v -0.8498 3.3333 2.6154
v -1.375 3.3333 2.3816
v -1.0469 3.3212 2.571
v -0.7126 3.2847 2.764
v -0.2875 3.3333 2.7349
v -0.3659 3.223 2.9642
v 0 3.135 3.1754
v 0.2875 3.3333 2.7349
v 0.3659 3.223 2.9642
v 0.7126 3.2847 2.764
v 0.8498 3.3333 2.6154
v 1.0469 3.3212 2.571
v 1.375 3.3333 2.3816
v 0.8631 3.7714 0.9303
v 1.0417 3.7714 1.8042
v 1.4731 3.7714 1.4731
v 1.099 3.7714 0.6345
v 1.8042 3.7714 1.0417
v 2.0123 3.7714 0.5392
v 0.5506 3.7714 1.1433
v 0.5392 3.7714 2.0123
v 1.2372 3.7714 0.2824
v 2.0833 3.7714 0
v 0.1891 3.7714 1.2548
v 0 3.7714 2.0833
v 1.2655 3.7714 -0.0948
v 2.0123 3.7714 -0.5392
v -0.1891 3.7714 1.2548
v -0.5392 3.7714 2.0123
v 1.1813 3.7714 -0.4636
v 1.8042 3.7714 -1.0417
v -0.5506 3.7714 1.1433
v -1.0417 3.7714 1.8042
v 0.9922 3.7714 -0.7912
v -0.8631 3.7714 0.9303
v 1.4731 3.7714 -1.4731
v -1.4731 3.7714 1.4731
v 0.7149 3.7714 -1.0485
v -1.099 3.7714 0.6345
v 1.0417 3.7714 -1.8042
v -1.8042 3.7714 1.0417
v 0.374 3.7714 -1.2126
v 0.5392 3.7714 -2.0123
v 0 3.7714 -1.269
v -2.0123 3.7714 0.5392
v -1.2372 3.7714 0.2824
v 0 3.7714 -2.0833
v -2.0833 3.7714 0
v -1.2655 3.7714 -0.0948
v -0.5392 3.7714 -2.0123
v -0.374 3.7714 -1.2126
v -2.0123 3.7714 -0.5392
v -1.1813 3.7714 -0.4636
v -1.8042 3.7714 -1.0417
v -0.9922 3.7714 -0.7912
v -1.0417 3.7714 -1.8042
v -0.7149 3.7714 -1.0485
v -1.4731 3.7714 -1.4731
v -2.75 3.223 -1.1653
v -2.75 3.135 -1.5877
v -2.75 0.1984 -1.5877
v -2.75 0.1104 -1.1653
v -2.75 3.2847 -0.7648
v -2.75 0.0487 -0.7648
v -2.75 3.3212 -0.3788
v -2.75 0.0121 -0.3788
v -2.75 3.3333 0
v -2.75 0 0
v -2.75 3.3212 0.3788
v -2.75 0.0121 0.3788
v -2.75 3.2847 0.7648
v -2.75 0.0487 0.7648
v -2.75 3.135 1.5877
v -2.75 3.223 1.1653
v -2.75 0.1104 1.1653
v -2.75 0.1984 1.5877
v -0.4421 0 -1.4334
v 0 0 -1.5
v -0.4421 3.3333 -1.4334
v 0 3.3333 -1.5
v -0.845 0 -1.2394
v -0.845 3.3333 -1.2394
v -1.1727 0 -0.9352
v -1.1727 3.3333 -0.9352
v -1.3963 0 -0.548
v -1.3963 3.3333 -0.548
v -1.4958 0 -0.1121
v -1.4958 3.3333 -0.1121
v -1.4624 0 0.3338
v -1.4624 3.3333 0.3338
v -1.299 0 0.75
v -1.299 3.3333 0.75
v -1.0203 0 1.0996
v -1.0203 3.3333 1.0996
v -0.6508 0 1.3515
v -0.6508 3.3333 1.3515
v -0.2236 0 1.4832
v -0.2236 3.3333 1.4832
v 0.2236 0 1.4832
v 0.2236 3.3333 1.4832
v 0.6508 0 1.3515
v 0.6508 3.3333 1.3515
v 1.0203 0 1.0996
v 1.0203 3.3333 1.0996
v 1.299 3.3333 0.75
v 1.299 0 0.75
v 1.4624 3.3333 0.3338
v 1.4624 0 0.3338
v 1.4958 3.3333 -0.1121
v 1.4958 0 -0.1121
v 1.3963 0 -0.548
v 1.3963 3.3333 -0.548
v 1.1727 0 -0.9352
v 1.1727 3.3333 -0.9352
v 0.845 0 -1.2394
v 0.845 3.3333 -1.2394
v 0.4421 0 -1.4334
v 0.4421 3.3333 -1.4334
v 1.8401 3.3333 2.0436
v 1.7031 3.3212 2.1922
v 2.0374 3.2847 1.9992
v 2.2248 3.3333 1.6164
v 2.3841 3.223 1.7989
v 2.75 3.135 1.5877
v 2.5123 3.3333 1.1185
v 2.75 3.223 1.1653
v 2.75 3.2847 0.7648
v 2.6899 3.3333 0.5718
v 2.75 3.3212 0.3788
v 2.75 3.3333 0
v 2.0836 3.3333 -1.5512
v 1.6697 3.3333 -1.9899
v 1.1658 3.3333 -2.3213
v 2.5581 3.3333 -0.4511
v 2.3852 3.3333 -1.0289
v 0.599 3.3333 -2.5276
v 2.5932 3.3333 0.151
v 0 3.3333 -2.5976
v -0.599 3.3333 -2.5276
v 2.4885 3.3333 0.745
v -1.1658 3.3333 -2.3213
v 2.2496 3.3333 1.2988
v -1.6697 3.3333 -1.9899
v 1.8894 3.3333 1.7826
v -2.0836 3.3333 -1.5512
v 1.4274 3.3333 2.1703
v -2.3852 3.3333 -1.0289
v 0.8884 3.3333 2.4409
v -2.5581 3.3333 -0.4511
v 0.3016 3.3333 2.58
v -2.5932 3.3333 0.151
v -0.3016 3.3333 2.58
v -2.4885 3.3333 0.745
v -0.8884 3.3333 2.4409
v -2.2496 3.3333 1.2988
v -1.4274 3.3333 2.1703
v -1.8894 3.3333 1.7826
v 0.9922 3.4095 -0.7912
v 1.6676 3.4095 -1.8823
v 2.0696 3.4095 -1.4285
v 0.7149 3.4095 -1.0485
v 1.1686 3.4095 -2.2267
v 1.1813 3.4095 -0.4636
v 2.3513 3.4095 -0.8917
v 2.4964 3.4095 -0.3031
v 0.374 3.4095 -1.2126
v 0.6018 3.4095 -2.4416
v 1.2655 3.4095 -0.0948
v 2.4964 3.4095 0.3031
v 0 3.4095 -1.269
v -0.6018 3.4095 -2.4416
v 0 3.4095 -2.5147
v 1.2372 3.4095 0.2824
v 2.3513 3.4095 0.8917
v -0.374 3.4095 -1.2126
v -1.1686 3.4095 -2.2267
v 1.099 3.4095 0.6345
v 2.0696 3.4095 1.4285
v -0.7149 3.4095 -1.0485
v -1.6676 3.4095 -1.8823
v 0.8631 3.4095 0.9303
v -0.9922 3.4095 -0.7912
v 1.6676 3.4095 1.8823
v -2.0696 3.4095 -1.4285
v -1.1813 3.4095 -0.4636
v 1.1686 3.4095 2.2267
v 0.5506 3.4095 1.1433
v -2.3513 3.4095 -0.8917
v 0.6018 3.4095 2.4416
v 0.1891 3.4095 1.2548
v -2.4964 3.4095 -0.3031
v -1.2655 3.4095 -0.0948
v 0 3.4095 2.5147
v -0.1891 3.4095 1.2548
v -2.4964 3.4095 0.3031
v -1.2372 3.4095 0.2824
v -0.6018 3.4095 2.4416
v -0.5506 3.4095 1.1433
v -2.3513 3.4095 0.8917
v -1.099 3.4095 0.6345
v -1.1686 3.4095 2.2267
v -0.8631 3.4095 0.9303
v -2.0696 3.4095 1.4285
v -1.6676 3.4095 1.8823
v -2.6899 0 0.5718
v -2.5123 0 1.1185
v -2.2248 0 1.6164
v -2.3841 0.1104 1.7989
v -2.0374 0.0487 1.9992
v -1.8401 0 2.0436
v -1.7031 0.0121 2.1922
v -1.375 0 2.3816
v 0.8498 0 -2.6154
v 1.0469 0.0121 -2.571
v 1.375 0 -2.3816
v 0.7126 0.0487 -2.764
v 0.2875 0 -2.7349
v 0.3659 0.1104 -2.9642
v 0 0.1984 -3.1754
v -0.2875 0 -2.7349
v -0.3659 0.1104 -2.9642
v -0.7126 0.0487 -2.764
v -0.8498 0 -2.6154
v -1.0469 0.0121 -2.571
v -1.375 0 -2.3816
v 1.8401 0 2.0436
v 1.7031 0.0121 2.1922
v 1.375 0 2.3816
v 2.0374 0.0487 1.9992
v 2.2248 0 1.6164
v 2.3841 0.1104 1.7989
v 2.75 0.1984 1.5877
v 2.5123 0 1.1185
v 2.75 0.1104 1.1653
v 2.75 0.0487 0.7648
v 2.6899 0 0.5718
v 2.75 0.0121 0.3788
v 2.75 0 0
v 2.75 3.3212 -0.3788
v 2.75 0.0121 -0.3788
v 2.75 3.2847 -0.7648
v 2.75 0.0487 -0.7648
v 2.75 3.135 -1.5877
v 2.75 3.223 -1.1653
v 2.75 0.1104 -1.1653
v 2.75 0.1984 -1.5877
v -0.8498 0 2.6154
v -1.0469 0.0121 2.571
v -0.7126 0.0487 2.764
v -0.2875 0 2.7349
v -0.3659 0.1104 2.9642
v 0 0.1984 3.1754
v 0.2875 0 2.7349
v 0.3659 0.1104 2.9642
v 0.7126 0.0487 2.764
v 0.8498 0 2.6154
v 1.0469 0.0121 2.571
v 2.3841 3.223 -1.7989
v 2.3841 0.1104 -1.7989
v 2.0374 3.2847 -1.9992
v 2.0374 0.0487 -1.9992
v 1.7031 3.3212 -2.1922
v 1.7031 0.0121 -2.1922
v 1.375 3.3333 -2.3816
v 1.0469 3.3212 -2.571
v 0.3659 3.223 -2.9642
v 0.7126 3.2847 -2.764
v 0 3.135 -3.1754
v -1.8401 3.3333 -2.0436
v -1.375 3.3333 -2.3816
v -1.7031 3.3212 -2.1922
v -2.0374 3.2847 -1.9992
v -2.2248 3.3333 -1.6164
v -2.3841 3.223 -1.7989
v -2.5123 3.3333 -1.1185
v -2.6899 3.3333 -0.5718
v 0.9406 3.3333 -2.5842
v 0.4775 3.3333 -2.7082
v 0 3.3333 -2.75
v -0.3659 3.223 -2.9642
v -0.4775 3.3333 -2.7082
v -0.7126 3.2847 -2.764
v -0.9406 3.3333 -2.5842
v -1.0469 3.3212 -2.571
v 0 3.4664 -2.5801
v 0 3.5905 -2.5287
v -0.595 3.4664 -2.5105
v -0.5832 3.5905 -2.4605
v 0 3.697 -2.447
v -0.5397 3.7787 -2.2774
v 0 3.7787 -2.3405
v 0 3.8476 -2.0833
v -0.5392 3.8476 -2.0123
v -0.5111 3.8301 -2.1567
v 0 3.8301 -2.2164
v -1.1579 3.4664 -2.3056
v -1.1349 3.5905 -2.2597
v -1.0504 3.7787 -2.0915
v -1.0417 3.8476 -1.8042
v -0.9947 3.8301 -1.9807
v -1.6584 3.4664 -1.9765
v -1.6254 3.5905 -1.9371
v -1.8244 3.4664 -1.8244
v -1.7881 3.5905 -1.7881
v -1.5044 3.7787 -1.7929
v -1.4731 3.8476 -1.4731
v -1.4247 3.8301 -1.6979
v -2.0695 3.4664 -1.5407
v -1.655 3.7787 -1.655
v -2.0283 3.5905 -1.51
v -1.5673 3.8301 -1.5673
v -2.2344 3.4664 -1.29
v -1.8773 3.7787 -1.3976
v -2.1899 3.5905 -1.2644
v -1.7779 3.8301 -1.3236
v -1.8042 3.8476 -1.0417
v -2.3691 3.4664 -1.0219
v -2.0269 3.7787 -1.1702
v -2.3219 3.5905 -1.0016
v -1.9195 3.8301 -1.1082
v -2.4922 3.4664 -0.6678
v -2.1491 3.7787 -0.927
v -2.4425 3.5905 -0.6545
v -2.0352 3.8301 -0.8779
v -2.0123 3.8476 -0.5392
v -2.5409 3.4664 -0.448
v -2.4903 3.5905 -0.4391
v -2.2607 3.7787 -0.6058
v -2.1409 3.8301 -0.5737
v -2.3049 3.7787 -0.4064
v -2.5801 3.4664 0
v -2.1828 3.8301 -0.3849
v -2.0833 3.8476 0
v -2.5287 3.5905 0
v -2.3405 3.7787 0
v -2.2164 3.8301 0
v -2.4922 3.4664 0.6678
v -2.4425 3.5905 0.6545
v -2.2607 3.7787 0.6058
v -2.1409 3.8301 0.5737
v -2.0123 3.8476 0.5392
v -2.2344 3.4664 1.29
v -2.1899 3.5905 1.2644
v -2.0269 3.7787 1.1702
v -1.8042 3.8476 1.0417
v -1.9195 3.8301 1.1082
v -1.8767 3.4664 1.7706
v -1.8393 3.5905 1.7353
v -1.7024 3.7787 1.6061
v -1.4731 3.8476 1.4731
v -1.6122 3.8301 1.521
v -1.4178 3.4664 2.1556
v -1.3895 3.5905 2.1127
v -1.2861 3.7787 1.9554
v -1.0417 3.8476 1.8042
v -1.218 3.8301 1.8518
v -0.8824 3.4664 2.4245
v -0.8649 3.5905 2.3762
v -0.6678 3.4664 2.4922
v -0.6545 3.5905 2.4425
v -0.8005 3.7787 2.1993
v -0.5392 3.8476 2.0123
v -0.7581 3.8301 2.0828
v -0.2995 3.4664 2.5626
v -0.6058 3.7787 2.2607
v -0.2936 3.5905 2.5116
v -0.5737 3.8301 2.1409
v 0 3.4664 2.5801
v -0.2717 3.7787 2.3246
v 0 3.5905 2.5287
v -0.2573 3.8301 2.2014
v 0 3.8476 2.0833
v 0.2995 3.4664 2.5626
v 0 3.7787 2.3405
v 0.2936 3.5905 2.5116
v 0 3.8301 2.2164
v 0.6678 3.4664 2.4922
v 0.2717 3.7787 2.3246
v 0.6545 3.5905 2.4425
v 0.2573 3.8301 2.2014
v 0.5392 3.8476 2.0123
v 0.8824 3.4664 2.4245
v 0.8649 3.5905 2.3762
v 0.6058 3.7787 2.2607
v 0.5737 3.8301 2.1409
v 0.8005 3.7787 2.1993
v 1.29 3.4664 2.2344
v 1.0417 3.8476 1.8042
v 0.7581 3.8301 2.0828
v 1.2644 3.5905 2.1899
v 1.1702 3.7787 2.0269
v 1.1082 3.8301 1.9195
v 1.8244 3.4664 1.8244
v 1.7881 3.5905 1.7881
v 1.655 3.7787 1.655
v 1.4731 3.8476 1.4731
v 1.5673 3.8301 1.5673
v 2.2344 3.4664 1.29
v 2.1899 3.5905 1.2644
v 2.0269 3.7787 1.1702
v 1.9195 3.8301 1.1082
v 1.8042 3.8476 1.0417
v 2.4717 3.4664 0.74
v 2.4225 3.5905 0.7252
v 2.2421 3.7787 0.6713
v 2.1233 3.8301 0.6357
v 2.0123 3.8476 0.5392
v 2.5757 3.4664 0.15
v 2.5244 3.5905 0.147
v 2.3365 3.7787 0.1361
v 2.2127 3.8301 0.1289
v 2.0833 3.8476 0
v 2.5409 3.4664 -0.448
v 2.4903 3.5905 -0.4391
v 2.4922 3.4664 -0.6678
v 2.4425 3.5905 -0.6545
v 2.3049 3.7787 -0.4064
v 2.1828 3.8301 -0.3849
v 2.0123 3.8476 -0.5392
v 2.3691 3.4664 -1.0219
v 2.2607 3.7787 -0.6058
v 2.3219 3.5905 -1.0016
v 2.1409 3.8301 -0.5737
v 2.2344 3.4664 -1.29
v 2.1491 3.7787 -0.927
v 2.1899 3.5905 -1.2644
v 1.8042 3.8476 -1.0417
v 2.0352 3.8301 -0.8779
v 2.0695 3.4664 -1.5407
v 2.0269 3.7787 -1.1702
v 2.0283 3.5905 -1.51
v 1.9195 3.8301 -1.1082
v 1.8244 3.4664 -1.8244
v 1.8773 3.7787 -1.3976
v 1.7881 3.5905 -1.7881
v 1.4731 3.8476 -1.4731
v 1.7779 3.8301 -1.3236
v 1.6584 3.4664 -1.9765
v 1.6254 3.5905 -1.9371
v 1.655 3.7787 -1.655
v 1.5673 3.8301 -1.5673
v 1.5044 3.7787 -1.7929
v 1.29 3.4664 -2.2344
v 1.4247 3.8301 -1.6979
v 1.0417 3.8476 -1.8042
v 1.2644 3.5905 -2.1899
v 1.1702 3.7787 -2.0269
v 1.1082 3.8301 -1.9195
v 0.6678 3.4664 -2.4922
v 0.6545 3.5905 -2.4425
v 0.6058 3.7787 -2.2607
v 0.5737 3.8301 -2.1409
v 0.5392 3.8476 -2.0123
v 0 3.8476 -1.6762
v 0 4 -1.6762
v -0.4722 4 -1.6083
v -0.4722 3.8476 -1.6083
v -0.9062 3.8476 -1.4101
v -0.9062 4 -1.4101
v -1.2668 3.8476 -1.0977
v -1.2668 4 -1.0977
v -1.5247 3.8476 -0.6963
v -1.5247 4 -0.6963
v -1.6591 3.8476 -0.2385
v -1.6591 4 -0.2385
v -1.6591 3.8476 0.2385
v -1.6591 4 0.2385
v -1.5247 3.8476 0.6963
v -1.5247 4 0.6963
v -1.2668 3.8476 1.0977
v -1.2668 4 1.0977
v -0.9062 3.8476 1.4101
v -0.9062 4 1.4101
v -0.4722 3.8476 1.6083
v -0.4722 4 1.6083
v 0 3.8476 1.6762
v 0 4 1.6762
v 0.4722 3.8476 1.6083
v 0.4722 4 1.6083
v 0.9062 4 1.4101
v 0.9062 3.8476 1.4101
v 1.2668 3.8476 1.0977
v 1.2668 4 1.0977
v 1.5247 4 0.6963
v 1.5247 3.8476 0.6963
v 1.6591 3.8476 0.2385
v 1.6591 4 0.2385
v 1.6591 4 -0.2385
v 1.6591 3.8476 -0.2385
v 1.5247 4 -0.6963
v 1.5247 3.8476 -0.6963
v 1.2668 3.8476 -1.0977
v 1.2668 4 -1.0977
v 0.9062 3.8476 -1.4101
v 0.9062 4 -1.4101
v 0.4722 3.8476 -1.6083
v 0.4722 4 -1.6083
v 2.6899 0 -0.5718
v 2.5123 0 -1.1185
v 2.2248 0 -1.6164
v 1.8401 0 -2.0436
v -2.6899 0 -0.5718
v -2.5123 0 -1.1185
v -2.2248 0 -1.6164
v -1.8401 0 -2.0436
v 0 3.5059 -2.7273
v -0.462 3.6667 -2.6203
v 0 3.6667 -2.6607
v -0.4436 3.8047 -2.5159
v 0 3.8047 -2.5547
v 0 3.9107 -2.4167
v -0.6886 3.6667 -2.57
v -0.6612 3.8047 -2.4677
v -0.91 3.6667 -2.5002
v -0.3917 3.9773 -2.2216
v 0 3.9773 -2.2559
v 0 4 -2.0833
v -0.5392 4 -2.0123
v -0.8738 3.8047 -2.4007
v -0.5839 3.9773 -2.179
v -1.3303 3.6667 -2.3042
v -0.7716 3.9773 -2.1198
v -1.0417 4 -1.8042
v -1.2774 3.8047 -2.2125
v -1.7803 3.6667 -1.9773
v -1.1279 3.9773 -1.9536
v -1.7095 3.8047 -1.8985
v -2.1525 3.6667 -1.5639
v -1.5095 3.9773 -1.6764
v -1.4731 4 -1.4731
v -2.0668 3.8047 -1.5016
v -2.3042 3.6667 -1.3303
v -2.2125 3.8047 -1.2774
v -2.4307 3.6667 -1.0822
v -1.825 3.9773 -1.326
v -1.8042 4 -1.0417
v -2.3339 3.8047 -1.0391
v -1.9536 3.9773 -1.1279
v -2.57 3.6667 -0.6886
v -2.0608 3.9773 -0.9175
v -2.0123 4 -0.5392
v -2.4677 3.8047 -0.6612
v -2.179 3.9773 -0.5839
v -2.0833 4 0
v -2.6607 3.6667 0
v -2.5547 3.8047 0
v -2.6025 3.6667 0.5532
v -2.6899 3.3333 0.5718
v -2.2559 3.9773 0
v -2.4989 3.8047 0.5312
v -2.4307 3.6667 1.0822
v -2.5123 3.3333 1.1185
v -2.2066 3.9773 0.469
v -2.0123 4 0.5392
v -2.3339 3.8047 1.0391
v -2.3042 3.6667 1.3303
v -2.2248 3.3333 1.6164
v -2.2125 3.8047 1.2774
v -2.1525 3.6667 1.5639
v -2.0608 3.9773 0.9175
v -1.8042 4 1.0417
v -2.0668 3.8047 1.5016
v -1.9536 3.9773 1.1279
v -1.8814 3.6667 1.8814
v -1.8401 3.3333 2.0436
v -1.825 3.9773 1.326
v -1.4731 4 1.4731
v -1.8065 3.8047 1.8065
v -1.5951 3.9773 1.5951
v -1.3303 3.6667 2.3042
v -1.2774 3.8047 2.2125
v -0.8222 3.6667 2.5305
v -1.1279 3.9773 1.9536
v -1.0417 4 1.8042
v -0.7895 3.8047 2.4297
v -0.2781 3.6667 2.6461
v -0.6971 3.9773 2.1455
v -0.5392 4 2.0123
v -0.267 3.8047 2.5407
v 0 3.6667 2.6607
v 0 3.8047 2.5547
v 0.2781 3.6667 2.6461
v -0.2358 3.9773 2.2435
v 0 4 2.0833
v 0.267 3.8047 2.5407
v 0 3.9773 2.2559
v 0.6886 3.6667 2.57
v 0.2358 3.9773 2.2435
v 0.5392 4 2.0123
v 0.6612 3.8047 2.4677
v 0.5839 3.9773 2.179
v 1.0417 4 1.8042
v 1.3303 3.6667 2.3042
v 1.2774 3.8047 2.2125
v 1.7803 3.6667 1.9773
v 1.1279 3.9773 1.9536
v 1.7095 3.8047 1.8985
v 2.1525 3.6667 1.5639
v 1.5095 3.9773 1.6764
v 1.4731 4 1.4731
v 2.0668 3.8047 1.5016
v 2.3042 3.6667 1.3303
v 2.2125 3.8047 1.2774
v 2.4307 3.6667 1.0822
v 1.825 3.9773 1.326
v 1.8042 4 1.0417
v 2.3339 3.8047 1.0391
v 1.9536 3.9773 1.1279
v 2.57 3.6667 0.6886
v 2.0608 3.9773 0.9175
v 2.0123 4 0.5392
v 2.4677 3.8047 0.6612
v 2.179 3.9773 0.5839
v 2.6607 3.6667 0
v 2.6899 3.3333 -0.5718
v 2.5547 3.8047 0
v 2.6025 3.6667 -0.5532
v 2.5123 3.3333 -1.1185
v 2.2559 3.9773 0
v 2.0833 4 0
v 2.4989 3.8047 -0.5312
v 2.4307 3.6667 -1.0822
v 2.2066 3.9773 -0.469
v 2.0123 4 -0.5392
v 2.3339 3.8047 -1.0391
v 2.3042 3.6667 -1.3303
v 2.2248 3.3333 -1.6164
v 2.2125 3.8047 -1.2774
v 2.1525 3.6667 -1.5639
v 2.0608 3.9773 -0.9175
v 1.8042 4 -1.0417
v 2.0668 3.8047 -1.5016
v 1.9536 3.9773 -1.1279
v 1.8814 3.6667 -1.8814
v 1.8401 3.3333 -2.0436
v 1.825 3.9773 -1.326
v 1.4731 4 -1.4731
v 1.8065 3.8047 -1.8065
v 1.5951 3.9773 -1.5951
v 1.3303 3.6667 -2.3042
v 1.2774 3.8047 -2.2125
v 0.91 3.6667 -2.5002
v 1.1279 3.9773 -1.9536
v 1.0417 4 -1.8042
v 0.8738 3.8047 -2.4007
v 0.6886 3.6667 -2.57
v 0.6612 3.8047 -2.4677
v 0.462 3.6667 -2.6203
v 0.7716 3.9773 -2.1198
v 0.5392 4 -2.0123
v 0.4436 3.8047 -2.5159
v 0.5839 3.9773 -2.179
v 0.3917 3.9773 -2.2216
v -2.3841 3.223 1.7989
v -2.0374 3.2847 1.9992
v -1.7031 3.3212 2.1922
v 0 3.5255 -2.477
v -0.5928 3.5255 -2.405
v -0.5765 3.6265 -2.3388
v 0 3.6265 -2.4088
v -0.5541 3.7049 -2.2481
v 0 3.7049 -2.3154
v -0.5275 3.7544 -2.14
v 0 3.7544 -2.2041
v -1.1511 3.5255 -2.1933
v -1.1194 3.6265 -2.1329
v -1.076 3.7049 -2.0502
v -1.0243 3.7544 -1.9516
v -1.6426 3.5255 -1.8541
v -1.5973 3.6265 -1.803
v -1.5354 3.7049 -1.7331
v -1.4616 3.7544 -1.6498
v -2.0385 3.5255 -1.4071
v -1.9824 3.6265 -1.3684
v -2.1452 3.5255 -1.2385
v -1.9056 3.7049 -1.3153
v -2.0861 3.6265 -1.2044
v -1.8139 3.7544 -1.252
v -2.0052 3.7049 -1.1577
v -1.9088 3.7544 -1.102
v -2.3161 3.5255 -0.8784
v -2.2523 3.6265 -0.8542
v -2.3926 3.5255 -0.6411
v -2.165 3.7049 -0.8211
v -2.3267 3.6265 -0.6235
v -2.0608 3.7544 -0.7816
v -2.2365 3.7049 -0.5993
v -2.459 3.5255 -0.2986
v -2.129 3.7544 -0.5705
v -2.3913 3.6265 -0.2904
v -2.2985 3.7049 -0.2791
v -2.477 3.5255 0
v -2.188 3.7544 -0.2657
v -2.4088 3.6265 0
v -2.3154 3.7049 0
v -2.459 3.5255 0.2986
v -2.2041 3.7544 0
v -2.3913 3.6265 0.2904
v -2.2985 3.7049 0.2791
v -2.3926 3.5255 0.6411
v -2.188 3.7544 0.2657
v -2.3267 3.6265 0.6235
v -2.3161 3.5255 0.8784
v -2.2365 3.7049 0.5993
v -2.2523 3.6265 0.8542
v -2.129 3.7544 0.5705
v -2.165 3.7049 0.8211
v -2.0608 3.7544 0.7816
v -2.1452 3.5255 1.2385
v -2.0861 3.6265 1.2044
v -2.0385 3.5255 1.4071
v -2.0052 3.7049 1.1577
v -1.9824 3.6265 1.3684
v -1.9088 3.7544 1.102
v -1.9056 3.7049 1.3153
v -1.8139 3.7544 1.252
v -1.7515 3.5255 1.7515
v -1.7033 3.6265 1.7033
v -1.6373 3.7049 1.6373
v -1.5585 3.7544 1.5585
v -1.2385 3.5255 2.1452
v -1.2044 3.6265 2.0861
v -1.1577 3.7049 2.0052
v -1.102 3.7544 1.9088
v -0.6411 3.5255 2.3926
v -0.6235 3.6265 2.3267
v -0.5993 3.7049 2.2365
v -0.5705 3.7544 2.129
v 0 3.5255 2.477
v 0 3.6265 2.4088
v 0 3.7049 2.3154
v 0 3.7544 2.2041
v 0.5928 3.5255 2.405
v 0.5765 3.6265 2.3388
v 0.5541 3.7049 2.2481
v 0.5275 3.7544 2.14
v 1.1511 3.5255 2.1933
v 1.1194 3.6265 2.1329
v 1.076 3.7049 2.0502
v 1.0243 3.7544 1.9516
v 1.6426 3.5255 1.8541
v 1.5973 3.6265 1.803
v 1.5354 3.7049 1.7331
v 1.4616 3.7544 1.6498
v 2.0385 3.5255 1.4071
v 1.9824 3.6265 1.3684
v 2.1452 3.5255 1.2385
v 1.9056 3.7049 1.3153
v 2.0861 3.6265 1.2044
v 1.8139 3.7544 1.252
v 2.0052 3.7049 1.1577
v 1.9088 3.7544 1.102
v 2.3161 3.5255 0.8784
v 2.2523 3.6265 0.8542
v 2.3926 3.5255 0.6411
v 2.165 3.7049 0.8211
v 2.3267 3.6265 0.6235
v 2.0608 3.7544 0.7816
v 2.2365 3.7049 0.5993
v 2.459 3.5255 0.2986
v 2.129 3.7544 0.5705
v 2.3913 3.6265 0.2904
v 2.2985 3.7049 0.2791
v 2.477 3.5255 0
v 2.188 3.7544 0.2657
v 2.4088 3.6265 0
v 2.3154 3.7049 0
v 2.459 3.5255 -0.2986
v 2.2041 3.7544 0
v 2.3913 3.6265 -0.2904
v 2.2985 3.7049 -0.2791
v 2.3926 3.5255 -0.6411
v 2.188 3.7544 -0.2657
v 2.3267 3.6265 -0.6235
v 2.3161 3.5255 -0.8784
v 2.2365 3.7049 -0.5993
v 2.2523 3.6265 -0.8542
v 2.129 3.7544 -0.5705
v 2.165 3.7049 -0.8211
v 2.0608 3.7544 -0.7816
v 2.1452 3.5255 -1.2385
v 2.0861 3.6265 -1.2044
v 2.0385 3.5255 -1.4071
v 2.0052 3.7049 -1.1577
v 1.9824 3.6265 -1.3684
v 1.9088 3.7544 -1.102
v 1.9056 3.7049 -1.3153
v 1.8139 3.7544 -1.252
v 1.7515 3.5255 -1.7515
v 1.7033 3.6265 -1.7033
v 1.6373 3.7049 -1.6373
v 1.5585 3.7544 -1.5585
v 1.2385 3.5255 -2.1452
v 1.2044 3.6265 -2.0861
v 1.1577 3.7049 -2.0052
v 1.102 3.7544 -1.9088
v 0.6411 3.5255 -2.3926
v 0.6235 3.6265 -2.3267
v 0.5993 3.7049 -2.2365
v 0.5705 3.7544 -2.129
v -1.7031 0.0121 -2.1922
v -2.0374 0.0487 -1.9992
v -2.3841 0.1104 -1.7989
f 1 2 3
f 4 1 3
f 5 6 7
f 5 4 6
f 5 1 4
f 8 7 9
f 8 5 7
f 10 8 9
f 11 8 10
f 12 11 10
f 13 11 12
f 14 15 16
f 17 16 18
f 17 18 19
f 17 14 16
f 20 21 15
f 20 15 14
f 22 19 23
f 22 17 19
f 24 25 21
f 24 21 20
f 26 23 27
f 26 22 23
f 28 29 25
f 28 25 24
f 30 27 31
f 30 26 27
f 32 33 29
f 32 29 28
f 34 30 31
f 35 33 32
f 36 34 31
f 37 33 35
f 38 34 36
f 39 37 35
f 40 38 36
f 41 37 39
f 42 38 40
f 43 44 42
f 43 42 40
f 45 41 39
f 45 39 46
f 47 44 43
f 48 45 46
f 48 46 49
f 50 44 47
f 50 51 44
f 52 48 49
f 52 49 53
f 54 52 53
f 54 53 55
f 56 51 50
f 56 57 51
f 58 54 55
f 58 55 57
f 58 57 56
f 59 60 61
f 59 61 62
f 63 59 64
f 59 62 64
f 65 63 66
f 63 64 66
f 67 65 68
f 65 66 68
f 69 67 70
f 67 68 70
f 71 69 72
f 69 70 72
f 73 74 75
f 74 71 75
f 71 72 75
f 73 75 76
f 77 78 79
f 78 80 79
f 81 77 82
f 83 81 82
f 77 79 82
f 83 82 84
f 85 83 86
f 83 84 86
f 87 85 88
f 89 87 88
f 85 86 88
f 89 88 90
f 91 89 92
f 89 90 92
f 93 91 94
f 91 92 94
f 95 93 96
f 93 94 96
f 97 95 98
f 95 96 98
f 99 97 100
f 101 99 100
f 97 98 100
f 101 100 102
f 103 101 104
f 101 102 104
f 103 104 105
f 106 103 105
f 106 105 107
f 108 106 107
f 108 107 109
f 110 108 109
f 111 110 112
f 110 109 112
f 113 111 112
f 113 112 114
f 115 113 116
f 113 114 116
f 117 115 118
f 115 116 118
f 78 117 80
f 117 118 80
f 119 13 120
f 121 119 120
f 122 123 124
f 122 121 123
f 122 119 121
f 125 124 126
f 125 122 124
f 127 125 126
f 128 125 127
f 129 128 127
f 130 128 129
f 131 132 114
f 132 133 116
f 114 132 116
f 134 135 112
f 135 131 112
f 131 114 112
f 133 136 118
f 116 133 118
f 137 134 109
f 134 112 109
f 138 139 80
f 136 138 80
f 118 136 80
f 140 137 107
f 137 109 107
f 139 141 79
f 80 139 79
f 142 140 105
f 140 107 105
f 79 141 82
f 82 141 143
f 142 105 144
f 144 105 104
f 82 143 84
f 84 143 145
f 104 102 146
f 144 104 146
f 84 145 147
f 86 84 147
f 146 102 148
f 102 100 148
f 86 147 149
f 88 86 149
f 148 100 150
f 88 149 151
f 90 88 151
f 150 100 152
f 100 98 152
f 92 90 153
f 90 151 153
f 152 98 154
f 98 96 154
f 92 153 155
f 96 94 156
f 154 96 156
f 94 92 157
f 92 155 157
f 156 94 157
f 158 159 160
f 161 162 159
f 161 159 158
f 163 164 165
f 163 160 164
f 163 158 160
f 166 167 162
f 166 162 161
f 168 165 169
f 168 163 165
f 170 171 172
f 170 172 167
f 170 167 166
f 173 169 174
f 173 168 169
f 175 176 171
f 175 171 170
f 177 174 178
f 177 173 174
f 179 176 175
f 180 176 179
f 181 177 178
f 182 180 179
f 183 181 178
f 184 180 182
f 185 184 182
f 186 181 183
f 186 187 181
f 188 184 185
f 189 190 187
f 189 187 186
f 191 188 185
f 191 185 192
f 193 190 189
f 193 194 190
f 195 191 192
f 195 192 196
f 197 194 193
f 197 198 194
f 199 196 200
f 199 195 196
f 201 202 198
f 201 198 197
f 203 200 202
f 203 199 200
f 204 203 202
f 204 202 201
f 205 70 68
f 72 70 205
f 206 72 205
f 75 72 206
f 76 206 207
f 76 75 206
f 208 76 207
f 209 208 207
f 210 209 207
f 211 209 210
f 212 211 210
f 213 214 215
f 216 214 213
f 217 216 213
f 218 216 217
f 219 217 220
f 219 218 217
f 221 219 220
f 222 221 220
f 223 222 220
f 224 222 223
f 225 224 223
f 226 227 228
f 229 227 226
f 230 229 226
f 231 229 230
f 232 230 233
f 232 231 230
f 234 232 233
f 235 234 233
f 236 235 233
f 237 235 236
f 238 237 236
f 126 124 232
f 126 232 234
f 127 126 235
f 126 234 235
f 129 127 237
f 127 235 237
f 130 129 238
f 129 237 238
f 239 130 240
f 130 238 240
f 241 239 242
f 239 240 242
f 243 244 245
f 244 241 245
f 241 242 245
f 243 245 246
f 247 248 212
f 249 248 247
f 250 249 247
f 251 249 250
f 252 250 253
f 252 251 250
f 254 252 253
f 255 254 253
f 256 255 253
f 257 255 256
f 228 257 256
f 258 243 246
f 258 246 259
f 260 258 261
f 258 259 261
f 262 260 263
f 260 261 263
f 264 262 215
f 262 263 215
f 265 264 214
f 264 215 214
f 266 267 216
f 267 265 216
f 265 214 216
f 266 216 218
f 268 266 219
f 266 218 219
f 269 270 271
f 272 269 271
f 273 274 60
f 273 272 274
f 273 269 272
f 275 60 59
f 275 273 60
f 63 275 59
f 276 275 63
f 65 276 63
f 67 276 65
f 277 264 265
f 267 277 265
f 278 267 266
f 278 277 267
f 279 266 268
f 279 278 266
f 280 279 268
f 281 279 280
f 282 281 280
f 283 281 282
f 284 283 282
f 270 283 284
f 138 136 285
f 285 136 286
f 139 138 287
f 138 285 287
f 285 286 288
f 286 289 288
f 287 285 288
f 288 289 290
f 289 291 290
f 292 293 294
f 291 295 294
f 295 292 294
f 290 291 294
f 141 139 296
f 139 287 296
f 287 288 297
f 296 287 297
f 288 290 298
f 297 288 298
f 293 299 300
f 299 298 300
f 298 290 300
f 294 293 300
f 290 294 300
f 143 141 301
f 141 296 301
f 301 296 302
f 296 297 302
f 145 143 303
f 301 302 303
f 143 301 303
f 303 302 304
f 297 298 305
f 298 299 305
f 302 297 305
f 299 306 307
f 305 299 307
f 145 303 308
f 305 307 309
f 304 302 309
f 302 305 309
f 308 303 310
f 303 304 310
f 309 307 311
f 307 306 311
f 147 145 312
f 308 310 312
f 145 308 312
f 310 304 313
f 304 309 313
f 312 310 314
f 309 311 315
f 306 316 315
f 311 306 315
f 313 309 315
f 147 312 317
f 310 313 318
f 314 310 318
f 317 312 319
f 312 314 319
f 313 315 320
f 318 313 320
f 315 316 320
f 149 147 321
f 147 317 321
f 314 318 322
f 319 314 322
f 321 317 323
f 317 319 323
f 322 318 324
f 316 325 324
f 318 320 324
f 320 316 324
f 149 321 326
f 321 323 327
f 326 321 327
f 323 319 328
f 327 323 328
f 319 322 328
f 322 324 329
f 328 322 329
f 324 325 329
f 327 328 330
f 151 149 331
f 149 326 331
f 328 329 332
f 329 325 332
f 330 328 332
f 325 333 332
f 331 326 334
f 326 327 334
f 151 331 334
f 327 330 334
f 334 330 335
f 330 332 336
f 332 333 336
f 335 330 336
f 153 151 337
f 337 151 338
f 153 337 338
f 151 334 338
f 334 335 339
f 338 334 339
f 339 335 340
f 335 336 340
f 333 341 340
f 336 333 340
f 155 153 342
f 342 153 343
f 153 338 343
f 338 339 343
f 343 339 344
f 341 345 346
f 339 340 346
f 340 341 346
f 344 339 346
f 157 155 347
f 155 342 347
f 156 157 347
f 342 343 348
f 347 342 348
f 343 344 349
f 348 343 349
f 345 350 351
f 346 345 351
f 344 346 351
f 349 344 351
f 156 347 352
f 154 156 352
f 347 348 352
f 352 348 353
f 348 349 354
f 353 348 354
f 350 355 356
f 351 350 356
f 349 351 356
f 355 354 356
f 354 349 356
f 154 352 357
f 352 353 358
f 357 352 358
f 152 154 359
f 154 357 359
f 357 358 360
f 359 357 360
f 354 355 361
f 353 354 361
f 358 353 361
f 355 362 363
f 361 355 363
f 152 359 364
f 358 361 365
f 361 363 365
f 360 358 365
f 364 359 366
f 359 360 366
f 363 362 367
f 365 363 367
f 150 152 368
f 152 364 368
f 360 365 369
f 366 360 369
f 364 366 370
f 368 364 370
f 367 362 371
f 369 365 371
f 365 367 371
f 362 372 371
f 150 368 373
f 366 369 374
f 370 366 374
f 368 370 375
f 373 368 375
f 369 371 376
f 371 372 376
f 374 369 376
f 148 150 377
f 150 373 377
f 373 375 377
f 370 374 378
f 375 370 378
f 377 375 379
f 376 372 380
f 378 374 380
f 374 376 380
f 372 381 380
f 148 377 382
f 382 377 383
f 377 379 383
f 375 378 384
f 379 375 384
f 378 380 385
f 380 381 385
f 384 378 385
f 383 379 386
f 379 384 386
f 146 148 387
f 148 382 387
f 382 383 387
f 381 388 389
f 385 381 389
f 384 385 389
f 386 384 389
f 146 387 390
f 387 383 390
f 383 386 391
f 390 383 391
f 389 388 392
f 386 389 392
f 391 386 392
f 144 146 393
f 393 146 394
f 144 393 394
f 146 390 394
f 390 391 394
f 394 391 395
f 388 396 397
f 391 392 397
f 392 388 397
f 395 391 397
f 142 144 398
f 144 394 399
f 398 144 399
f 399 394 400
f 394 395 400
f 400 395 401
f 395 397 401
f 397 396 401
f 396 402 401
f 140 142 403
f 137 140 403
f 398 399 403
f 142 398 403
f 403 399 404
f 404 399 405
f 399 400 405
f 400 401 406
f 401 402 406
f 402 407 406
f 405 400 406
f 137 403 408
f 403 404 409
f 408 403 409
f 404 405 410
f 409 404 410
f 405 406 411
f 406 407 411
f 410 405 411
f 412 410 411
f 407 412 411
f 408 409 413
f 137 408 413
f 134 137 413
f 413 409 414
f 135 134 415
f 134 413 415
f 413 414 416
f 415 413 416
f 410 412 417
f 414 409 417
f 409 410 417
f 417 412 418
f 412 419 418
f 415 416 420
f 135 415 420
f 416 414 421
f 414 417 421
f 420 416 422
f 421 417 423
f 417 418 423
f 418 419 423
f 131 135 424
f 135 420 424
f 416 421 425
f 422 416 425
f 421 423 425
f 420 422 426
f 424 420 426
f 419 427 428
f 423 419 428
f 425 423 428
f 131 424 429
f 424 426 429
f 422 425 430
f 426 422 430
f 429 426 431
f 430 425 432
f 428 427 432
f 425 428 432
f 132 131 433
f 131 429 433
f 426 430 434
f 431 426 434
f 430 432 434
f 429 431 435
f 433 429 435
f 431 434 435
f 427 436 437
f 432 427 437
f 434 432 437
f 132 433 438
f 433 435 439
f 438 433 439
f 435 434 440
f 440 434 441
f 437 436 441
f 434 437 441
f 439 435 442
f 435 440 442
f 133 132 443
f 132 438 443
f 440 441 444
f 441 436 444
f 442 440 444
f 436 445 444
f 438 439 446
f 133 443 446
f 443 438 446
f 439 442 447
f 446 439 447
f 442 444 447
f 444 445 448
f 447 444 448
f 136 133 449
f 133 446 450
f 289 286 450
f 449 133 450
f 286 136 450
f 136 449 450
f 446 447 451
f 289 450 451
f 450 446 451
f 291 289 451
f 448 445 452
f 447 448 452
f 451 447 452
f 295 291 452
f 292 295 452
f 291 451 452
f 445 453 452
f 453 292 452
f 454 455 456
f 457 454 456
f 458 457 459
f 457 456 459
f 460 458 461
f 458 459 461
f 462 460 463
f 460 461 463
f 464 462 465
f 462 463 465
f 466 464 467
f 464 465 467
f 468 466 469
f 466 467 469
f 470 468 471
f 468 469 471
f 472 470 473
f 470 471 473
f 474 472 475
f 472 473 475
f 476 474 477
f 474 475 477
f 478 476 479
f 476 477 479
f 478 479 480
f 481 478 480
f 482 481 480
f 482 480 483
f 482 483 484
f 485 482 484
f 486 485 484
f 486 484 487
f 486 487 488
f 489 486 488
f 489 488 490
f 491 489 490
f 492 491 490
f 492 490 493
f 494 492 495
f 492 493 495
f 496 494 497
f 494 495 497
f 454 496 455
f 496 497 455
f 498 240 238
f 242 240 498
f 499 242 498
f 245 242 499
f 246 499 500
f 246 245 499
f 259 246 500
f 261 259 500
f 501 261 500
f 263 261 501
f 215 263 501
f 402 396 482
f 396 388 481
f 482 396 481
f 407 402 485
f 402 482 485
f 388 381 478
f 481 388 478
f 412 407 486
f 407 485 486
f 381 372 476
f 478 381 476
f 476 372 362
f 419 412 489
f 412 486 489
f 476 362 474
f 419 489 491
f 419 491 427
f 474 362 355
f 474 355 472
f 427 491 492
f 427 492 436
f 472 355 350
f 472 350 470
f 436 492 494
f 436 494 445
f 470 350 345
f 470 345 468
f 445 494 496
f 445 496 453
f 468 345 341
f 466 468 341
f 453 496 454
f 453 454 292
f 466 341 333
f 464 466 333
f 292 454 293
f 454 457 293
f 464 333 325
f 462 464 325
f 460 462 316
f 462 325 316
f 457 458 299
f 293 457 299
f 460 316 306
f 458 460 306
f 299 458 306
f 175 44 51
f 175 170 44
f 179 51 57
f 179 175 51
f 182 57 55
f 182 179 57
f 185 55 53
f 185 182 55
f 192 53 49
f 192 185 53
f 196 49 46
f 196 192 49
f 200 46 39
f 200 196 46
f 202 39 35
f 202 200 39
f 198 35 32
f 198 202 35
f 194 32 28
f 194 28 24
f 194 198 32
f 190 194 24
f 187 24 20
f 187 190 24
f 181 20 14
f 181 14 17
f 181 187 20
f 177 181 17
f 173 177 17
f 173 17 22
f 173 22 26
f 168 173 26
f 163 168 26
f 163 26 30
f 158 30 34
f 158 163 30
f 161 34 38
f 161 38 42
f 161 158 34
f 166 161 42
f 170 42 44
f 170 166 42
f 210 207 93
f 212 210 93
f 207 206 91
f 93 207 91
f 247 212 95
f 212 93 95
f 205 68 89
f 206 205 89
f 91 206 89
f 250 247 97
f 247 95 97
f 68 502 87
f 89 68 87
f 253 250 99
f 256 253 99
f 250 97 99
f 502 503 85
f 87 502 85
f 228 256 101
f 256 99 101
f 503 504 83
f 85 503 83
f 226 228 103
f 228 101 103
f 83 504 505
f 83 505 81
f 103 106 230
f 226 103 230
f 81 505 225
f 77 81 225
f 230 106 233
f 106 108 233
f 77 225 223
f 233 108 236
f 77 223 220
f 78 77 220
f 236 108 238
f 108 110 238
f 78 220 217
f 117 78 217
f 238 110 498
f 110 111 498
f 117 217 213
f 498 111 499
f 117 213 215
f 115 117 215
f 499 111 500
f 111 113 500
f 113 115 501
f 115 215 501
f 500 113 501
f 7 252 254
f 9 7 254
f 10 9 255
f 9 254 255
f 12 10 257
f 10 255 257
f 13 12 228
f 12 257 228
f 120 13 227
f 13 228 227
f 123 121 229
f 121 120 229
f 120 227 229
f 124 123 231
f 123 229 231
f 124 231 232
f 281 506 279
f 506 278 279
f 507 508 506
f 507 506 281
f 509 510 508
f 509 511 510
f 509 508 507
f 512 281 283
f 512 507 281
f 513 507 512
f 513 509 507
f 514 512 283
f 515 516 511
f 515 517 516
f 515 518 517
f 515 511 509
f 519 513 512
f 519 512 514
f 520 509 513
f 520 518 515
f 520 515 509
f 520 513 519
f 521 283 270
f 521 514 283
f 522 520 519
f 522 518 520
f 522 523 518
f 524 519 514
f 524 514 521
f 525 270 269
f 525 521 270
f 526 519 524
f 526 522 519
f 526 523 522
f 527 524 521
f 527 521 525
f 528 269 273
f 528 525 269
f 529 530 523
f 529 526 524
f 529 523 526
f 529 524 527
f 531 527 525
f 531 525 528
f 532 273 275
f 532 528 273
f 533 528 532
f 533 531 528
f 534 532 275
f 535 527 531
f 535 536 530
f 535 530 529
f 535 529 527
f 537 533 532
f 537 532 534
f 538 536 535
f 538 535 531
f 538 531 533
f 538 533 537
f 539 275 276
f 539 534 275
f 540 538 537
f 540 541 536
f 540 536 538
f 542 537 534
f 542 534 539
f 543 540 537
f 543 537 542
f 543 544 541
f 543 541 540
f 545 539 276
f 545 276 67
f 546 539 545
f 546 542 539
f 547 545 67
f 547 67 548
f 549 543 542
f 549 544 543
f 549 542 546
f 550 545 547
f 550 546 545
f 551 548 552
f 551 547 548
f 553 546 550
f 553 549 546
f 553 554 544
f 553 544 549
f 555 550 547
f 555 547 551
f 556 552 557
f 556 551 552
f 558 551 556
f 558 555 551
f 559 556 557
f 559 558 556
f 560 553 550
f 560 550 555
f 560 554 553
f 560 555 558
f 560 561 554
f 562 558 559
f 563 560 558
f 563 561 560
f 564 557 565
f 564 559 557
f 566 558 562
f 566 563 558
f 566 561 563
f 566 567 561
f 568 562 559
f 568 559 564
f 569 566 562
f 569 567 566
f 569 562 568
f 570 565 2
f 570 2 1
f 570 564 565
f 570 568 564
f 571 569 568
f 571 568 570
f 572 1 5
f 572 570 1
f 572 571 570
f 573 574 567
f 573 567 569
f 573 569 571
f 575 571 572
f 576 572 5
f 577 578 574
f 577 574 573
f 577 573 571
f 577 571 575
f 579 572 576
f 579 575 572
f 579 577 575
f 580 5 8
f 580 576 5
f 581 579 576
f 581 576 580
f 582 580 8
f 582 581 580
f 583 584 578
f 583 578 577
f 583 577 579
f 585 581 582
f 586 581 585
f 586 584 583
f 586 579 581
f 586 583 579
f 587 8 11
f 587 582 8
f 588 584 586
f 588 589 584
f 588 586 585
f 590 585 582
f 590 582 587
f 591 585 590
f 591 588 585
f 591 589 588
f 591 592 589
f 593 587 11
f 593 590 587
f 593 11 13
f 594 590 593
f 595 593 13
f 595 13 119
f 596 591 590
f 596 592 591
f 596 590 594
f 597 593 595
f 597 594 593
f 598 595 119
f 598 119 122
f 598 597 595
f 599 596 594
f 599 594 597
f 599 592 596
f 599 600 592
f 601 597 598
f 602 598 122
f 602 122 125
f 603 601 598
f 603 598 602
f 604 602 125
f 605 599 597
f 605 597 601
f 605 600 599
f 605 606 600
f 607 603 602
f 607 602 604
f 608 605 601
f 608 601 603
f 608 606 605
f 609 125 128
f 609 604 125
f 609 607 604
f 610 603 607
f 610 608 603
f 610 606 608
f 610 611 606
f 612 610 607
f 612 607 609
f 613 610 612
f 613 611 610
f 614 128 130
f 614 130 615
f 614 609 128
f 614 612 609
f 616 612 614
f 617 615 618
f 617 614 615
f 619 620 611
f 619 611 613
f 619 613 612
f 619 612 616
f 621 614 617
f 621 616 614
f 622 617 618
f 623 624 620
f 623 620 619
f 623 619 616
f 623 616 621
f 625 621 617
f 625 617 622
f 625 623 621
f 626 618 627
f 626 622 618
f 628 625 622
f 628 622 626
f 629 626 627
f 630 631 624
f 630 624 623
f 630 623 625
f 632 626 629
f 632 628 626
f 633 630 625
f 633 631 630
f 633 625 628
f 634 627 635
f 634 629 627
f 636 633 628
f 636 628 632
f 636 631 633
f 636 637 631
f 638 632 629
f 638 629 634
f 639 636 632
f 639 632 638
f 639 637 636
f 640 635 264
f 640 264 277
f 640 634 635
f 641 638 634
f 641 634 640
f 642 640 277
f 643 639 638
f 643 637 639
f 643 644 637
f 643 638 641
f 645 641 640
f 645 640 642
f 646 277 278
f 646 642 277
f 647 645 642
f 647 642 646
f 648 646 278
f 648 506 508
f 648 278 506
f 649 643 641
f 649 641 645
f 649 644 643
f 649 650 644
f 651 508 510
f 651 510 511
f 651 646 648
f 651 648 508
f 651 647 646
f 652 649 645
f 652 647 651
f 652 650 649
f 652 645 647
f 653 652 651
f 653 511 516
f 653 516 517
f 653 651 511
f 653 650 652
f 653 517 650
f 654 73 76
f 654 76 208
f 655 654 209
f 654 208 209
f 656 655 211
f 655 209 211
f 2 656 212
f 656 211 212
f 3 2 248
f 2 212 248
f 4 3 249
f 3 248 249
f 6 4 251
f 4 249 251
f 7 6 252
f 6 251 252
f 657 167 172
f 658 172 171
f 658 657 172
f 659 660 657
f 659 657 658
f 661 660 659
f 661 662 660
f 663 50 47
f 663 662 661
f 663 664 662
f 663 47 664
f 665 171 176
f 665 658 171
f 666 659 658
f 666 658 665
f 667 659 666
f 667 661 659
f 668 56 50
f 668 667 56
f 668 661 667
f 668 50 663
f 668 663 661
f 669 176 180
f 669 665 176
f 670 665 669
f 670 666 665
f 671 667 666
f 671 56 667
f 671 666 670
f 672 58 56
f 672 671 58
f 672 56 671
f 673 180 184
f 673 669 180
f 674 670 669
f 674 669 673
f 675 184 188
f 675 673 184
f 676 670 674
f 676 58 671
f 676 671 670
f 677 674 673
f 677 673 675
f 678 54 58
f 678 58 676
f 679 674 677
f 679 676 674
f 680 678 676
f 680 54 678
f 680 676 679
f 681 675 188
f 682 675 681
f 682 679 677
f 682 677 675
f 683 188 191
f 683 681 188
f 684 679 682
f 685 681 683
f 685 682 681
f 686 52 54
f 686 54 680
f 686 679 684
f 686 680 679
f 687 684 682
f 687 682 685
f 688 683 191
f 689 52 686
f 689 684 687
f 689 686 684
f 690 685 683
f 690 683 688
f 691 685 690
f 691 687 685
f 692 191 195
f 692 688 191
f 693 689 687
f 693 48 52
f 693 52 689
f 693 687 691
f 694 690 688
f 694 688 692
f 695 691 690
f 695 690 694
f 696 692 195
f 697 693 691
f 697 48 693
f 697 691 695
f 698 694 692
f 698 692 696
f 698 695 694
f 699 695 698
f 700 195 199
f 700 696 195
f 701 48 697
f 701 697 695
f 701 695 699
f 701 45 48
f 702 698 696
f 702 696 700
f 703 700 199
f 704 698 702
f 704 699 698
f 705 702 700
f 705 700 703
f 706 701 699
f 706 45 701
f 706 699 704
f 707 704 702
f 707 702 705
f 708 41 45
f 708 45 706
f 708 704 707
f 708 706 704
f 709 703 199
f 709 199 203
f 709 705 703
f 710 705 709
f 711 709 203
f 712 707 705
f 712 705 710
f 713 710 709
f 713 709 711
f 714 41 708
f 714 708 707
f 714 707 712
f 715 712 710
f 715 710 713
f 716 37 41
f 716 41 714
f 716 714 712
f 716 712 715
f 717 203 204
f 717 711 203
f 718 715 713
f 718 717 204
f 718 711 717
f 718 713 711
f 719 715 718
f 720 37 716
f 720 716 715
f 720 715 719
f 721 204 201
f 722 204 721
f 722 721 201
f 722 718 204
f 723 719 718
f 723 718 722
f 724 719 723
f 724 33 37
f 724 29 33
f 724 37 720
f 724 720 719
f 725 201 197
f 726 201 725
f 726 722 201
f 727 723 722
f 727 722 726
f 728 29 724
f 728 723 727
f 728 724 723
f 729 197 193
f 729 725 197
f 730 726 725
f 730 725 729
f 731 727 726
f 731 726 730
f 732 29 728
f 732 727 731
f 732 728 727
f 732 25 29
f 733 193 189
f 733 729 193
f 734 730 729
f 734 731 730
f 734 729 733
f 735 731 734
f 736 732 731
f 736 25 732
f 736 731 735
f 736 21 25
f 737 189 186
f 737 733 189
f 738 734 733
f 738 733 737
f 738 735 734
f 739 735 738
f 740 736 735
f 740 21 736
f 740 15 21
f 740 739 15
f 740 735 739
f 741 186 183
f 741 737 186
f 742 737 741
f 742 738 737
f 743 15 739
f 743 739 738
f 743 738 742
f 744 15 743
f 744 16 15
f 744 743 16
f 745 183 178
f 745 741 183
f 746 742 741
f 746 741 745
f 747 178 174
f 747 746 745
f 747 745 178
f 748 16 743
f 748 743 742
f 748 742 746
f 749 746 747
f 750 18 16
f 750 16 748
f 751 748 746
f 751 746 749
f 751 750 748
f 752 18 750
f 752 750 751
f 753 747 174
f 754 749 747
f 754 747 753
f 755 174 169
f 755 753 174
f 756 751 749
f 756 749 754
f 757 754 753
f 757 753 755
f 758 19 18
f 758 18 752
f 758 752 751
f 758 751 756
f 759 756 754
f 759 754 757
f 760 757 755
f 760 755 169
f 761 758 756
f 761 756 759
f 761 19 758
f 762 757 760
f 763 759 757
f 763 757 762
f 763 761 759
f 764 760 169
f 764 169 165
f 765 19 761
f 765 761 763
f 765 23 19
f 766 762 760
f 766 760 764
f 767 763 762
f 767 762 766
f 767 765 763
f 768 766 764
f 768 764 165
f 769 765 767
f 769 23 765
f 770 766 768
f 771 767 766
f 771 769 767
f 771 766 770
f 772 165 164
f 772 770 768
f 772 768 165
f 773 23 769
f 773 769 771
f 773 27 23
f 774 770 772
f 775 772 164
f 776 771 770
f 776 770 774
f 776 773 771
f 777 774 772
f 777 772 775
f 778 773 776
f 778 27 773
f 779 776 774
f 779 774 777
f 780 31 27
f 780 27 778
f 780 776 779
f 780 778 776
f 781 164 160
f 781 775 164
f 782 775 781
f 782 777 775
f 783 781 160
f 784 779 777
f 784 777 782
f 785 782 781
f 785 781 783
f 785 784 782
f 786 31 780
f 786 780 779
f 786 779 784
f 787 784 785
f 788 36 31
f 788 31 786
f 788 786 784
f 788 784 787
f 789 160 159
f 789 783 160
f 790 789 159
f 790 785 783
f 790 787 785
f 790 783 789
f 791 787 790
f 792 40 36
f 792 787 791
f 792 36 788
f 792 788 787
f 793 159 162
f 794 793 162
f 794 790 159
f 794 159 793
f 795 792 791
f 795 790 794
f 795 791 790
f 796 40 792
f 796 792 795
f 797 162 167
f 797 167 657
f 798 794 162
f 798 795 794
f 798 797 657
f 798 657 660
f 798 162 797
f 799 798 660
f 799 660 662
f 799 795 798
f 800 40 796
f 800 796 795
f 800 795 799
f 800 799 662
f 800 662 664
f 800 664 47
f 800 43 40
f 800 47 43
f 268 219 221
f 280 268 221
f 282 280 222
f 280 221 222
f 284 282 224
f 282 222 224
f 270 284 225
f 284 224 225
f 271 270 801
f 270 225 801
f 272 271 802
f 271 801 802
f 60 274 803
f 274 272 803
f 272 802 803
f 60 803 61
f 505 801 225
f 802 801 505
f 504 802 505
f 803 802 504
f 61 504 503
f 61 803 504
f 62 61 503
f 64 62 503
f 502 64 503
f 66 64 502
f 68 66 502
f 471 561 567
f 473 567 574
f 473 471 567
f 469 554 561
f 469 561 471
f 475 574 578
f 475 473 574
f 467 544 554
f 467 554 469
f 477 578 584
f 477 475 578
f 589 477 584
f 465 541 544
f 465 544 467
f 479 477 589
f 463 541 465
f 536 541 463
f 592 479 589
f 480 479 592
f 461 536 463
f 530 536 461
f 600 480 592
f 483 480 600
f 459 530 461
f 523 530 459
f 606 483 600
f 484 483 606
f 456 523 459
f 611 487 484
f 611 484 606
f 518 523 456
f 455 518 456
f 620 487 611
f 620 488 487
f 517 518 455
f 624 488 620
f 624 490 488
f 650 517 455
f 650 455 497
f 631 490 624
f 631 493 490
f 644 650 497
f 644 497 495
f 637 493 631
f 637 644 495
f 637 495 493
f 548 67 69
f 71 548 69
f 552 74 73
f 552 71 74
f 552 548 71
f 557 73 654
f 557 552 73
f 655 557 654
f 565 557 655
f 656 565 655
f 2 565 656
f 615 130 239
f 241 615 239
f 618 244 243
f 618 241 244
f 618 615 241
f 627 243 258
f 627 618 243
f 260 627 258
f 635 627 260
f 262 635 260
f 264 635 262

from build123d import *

# Parameters (mm, degrees)
EXTRUDE1_DEPTH = 4
SKETCH2_W      = 1.5
SKETCH2_H      = 4


with BuildPart() as part:
    # Sketch1 → Extrude1 (new body)
    with BuildSketch(Plane(origin=(0, 0, 0), x_dir=(1, 0, 0), z_dir=(0, 1, 0))):
        Polygon((0, 3.175426481), (-2.75, 1.58771324), (-2.75, -1.58771324), (0, -3.175426481), (2.75, -1.58771324), (2.75, 1.58771324), align=None)
    extrude(amount=EXTRUDE1_DEPTH)

    # Sketch4 → Cut-Revolve2 (revolve, cut)
    with BuildSketch(Plane(origin=(0, 0, 0), x_dir=(0, 0, -1), z_dir=(1, 0, 0))):
        Polygon((0, 4), (1.5, 4), (1.269011592, 3.892288336), (1.269011592, 0.107711664), (1.5, 0), (0, 0), align=None)
    revolve(axis=Axis((0, 4, 0), (0, 1, 0)), mode=Mode.SUBTRACT)


with BuildPart() as body_2:
    # Sketch2 → Revolve1 (revolve)
    with BuildSketch(Plane(origin=(0, 0, 0), x_dir=(0, 0, -1), z_dir=(1, 0, 0))):
        with Locations((0.75, 2)):
            Rectangle(SKETCH2_W, SKETCH2_H)
    revolve(axis=Axis((0, -1.5, 0), (0, 1, 0)))


with BuildPart() as part_1:
    add(part.part)

    # Combine1: cut body 2
    add(body_2.part, mode=Mode.SUBTRACT)

    # Sketch5 → Cut-Revolve3 (revolve, cut)
    with BuildSketch(Plane(origin=(0, 0, 0), x_dir=(0, 0, -1), z_dir=(1, 0, 0))):
        with BuildLine():
            Line((0, 0), (2.75, 0))
            Line((2.75, 0), (3.175426481, 0.198379626))
            Line((3.175426481, 0.198379626), (3.175426481, 3.134953707))
            Line((3.175426481, 3.134953707), (2.75, 3.333333333))
            ThreePointArc((2.75, 3.333333333), (2.554737854, 3.804737854), (2.083333333, 4))
            Line((2.083333333, 4), (2.083333333, 5.27))
            Line((2.083333333, 5.27), (4.445426481, 5.27))
            Line((4.445426481, 5.27), (4.445426481, -1.27))
            Line((4.445426481, -1.27), (0, -1.27))
            Line((0, -1.27), (0, 0))
        make_face()
    revolve(axis=Axis((0, 0, 0), (0, 1, 0)), mode=Mode.SUBTRACT)

    # Sketch6 → Cut-Revolve4 (revolve, cut)
    with BuildSketch(Plane(origin=(0, 0, 0), x_dir=(0, 0, -1), z_dir=(1, 0, 0))):
        with BuildLine():
            Line((0, 3.333333333), (2.5976, 3.333333333))
            ThreePointArc((2.5976, 3.333333333), (2.446974781, 3.696974781), (2.083333333, 3.8476))
            Line((2.083333333, 3.8476), (1.676172463, 3.8476))
            Line((1.676172463, 3.8476), (1.676172463, 5.27))
            Line((1.676172463, 5.27), (0, 5.27))
            Line((0, 5.27), (0, 3.333333333))
        make_face()
    revolve(axis=Axis((0, 5.27, 0), (0, 1, 0)), mode=Mode.SUBTRACT)


with BuildPart() as body_2_2:
    # Sketch7 → Revolve2 (revolve)
    with BuildSketch(Plane(origin=(0, 0, 0), x_dir=(0, 0, -1), z_dir=(1, 0, 0))):
        with BuildLine():
            Line((1.269011592, 3.409533333), (2.514721748, 3.409533333))
            ThreePointArc((2.514721748, 3.409533333), (2.36486639, 3.668954462), (2.083333333, 3.7714))
            Line((2.083333333, 3.7714), (1.269011592, 3.7714))
            Line((1.269011592, 3.7714), (1.269011592, 3.409533333))
        make_face()
    revolve(axis=Axis((0, 3.409533333, 0), (0, 1, 0)))


solid = Compound([part_1.part, body_2_2.part])
